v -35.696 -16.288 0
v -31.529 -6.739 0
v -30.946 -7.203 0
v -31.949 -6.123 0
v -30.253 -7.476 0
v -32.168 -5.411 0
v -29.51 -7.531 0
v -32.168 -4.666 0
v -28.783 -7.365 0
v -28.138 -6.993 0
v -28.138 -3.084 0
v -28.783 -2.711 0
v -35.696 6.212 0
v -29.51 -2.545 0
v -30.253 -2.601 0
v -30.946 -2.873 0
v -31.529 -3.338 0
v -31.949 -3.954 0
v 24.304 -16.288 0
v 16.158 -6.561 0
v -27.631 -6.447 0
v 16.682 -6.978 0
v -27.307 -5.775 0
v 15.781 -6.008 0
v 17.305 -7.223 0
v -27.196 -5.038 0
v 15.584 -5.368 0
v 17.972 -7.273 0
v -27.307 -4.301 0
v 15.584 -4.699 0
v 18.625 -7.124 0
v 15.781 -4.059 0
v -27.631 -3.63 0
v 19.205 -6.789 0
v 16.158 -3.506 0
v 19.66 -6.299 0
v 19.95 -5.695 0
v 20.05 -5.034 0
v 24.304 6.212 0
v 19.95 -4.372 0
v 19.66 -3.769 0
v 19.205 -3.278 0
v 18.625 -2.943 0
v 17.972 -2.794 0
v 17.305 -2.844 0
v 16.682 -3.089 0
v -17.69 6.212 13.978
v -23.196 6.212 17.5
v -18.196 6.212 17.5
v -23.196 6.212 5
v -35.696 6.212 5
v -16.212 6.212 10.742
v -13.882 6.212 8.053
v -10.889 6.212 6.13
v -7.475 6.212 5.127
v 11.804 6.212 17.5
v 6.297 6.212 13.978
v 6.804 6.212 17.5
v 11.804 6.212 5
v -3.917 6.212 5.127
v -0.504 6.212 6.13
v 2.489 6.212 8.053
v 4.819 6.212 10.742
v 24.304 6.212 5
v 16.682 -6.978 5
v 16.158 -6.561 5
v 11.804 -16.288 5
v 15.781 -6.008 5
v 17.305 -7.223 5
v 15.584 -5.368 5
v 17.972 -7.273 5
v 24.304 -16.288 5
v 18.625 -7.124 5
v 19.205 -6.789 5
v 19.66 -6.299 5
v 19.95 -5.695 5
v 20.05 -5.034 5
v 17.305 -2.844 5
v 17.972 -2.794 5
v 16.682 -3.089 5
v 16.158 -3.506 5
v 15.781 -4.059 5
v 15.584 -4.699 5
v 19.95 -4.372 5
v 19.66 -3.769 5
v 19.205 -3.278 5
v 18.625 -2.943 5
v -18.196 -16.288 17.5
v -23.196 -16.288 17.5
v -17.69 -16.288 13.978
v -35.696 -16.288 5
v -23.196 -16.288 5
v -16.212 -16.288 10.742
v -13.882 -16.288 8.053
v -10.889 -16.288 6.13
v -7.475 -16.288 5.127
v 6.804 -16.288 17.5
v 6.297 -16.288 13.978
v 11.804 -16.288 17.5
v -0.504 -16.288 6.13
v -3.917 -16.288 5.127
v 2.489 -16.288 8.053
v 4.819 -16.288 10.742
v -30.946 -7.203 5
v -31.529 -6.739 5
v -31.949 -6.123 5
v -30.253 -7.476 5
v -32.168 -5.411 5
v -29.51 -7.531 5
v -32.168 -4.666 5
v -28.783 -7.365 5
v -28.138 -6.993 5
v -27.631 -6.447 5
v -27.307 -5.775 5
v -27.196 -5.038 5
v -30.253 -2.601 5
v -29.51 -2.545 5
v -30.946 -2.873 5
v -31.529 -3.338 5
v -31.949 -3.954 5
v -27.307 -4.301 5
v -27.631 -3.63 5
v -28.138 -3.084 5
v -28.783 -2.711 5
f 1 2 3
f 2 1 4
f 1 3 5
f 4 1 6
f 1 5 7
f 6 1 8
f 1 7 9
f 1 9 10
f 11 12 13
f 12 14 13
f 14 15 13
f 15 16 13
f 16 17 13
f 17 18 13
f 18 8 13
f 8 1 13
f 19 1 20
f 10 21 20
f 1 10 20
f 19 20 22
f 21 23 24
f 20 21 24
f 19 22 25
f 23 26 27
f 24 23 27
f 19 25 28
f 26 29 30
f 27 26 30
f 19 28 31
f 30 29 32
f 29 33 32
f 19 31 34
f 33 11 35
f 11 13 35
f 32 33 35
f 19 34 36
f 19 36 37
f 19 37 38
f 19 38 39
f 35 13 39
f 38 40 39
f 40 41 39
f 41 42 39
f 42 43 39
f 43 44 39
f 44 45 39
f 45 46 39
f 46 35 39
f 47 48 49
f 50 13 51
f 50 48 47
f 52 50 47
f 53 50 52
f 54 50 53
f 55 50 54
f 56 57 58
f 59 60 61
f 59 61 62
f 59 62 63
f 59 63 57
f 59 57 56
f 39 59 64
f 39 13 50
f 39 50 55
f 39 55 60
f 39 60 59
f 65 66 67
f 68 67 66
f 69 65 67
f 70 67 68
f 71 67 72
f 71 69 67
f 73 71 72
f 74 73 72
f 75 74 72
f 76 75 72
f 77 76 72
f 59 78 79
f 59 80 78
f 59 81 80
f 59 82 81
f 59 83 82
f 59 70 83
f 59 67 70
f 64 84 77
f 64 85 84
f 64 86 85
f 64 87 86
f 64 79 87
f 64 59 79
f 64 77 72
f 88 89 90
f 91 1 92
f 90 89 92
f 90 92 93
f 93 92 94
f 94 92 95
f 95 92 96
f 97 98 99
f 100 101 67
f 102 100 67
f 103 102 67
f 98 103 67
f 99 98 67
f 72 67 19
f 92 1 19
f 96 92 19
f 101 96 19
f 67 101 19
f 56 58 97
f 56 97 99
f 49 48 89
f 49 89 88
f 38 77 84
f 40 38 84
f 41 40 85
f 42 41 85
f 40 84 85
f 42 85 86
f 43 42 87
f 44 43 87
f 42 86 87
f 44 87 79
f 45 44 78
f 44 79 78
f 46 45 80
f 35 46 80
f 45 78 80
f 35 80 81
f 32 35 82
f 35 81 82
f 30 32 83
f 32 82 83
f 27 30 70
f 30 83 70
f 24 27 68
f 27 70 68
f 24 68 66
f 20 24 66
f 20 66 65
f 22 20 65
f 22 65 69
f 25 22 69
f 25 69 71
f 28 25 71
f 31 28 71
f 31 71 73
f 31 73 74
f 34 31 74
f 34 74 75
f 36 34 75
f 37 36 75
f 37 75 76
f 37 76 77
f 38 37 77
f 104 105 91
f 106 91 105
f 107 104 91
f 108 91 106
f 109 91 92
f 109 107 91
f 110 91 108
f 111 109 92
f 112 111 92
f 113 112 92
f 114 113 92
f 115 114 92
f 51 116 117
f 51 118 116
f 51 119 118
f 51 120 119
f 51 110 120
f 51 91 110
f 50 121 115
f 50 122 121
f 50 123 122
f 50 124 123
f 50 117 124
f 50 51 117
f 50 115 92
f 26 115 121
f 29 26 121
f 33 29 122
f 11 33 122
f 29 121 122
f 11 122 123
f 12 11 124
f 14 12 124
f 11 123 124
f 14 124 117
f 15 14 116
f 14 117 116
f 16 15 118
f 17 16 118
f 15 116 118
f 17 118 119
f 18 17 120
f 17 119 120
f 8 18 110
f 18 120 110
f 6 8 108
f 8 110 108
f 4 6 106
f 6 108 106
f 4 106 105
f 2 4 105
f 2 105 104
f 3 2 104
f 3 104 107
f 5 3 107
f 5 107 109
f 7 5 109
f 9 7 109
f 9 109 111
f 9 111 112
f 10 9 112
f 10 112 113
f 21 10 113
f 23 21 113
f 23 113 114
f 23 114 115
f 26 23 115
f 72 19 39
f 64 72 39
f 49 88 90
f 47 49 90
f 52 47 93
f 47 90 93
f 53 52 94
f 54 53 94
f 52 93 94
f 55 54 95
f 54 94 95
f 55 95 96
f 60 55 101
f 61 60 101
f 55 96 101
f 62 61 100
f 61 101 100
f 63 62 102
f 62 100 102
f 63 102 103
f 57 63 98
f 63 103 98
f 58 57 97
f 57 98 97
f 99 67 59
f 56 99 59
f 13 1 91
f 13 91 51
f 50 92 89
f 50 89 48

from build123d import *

# Parameters (mm, degrees)
F0_W     = 60
F0_H     = 22.5
F1_DEPTH = 5
F2_W     = 35
F2_H     = 22.5
F3_DEPTH = 12.5
F5_DEPTH = 22.501
F6_R     = 2.5
F6_R_2   = 2.245551
F7_DEPTH = 5.001


with BuildPart() as f1:
    # F0 (on Top) → F1 (new body)
    with BuildSketch(Plane.XY):
        with Locations((-5.696384, -5.038032)):
            Rectangle(F0_W, F0_H)
    extrude(amount=F1_DEPTH)

    # F2 (on face) → F3 (join)
    with BuildSketch(Plane.XY.offset(5)):
        with Locations((-5.696384, -5.038032)):
            Rectangle(F2_W, F2_H)
    extrude(amount=F3_DEPTH)

    # F4 (on face) → F5 (cut, through all)
    with BuildSketch(Plane.XZ.offset(16.288032)):
        with BuildLine():
            Line((6.803616, 17.5), (-18.196384, 17.5))
            ThreePointArc((-18.196384, 17.5), (-5.696384, 5), (6.803616, 17.5))
        make_face()
    extrude(amount=-F5_DEPTH, mode=Mode.SUBTRACT)

    # F6 (on face) → F7 (cut, through all)
    with BuildSketch(Plane.XY.offset(5)):
        with Locations((-29.696384, -5.038232)):
            Circle(F6_R)
        with Locations((17.804456, -5.033552)):
            Circle(F6_R_2)
    extrude(amount=-F7_DEPTH, mode=Mode.SUBTRACT)


solid = f1.part
